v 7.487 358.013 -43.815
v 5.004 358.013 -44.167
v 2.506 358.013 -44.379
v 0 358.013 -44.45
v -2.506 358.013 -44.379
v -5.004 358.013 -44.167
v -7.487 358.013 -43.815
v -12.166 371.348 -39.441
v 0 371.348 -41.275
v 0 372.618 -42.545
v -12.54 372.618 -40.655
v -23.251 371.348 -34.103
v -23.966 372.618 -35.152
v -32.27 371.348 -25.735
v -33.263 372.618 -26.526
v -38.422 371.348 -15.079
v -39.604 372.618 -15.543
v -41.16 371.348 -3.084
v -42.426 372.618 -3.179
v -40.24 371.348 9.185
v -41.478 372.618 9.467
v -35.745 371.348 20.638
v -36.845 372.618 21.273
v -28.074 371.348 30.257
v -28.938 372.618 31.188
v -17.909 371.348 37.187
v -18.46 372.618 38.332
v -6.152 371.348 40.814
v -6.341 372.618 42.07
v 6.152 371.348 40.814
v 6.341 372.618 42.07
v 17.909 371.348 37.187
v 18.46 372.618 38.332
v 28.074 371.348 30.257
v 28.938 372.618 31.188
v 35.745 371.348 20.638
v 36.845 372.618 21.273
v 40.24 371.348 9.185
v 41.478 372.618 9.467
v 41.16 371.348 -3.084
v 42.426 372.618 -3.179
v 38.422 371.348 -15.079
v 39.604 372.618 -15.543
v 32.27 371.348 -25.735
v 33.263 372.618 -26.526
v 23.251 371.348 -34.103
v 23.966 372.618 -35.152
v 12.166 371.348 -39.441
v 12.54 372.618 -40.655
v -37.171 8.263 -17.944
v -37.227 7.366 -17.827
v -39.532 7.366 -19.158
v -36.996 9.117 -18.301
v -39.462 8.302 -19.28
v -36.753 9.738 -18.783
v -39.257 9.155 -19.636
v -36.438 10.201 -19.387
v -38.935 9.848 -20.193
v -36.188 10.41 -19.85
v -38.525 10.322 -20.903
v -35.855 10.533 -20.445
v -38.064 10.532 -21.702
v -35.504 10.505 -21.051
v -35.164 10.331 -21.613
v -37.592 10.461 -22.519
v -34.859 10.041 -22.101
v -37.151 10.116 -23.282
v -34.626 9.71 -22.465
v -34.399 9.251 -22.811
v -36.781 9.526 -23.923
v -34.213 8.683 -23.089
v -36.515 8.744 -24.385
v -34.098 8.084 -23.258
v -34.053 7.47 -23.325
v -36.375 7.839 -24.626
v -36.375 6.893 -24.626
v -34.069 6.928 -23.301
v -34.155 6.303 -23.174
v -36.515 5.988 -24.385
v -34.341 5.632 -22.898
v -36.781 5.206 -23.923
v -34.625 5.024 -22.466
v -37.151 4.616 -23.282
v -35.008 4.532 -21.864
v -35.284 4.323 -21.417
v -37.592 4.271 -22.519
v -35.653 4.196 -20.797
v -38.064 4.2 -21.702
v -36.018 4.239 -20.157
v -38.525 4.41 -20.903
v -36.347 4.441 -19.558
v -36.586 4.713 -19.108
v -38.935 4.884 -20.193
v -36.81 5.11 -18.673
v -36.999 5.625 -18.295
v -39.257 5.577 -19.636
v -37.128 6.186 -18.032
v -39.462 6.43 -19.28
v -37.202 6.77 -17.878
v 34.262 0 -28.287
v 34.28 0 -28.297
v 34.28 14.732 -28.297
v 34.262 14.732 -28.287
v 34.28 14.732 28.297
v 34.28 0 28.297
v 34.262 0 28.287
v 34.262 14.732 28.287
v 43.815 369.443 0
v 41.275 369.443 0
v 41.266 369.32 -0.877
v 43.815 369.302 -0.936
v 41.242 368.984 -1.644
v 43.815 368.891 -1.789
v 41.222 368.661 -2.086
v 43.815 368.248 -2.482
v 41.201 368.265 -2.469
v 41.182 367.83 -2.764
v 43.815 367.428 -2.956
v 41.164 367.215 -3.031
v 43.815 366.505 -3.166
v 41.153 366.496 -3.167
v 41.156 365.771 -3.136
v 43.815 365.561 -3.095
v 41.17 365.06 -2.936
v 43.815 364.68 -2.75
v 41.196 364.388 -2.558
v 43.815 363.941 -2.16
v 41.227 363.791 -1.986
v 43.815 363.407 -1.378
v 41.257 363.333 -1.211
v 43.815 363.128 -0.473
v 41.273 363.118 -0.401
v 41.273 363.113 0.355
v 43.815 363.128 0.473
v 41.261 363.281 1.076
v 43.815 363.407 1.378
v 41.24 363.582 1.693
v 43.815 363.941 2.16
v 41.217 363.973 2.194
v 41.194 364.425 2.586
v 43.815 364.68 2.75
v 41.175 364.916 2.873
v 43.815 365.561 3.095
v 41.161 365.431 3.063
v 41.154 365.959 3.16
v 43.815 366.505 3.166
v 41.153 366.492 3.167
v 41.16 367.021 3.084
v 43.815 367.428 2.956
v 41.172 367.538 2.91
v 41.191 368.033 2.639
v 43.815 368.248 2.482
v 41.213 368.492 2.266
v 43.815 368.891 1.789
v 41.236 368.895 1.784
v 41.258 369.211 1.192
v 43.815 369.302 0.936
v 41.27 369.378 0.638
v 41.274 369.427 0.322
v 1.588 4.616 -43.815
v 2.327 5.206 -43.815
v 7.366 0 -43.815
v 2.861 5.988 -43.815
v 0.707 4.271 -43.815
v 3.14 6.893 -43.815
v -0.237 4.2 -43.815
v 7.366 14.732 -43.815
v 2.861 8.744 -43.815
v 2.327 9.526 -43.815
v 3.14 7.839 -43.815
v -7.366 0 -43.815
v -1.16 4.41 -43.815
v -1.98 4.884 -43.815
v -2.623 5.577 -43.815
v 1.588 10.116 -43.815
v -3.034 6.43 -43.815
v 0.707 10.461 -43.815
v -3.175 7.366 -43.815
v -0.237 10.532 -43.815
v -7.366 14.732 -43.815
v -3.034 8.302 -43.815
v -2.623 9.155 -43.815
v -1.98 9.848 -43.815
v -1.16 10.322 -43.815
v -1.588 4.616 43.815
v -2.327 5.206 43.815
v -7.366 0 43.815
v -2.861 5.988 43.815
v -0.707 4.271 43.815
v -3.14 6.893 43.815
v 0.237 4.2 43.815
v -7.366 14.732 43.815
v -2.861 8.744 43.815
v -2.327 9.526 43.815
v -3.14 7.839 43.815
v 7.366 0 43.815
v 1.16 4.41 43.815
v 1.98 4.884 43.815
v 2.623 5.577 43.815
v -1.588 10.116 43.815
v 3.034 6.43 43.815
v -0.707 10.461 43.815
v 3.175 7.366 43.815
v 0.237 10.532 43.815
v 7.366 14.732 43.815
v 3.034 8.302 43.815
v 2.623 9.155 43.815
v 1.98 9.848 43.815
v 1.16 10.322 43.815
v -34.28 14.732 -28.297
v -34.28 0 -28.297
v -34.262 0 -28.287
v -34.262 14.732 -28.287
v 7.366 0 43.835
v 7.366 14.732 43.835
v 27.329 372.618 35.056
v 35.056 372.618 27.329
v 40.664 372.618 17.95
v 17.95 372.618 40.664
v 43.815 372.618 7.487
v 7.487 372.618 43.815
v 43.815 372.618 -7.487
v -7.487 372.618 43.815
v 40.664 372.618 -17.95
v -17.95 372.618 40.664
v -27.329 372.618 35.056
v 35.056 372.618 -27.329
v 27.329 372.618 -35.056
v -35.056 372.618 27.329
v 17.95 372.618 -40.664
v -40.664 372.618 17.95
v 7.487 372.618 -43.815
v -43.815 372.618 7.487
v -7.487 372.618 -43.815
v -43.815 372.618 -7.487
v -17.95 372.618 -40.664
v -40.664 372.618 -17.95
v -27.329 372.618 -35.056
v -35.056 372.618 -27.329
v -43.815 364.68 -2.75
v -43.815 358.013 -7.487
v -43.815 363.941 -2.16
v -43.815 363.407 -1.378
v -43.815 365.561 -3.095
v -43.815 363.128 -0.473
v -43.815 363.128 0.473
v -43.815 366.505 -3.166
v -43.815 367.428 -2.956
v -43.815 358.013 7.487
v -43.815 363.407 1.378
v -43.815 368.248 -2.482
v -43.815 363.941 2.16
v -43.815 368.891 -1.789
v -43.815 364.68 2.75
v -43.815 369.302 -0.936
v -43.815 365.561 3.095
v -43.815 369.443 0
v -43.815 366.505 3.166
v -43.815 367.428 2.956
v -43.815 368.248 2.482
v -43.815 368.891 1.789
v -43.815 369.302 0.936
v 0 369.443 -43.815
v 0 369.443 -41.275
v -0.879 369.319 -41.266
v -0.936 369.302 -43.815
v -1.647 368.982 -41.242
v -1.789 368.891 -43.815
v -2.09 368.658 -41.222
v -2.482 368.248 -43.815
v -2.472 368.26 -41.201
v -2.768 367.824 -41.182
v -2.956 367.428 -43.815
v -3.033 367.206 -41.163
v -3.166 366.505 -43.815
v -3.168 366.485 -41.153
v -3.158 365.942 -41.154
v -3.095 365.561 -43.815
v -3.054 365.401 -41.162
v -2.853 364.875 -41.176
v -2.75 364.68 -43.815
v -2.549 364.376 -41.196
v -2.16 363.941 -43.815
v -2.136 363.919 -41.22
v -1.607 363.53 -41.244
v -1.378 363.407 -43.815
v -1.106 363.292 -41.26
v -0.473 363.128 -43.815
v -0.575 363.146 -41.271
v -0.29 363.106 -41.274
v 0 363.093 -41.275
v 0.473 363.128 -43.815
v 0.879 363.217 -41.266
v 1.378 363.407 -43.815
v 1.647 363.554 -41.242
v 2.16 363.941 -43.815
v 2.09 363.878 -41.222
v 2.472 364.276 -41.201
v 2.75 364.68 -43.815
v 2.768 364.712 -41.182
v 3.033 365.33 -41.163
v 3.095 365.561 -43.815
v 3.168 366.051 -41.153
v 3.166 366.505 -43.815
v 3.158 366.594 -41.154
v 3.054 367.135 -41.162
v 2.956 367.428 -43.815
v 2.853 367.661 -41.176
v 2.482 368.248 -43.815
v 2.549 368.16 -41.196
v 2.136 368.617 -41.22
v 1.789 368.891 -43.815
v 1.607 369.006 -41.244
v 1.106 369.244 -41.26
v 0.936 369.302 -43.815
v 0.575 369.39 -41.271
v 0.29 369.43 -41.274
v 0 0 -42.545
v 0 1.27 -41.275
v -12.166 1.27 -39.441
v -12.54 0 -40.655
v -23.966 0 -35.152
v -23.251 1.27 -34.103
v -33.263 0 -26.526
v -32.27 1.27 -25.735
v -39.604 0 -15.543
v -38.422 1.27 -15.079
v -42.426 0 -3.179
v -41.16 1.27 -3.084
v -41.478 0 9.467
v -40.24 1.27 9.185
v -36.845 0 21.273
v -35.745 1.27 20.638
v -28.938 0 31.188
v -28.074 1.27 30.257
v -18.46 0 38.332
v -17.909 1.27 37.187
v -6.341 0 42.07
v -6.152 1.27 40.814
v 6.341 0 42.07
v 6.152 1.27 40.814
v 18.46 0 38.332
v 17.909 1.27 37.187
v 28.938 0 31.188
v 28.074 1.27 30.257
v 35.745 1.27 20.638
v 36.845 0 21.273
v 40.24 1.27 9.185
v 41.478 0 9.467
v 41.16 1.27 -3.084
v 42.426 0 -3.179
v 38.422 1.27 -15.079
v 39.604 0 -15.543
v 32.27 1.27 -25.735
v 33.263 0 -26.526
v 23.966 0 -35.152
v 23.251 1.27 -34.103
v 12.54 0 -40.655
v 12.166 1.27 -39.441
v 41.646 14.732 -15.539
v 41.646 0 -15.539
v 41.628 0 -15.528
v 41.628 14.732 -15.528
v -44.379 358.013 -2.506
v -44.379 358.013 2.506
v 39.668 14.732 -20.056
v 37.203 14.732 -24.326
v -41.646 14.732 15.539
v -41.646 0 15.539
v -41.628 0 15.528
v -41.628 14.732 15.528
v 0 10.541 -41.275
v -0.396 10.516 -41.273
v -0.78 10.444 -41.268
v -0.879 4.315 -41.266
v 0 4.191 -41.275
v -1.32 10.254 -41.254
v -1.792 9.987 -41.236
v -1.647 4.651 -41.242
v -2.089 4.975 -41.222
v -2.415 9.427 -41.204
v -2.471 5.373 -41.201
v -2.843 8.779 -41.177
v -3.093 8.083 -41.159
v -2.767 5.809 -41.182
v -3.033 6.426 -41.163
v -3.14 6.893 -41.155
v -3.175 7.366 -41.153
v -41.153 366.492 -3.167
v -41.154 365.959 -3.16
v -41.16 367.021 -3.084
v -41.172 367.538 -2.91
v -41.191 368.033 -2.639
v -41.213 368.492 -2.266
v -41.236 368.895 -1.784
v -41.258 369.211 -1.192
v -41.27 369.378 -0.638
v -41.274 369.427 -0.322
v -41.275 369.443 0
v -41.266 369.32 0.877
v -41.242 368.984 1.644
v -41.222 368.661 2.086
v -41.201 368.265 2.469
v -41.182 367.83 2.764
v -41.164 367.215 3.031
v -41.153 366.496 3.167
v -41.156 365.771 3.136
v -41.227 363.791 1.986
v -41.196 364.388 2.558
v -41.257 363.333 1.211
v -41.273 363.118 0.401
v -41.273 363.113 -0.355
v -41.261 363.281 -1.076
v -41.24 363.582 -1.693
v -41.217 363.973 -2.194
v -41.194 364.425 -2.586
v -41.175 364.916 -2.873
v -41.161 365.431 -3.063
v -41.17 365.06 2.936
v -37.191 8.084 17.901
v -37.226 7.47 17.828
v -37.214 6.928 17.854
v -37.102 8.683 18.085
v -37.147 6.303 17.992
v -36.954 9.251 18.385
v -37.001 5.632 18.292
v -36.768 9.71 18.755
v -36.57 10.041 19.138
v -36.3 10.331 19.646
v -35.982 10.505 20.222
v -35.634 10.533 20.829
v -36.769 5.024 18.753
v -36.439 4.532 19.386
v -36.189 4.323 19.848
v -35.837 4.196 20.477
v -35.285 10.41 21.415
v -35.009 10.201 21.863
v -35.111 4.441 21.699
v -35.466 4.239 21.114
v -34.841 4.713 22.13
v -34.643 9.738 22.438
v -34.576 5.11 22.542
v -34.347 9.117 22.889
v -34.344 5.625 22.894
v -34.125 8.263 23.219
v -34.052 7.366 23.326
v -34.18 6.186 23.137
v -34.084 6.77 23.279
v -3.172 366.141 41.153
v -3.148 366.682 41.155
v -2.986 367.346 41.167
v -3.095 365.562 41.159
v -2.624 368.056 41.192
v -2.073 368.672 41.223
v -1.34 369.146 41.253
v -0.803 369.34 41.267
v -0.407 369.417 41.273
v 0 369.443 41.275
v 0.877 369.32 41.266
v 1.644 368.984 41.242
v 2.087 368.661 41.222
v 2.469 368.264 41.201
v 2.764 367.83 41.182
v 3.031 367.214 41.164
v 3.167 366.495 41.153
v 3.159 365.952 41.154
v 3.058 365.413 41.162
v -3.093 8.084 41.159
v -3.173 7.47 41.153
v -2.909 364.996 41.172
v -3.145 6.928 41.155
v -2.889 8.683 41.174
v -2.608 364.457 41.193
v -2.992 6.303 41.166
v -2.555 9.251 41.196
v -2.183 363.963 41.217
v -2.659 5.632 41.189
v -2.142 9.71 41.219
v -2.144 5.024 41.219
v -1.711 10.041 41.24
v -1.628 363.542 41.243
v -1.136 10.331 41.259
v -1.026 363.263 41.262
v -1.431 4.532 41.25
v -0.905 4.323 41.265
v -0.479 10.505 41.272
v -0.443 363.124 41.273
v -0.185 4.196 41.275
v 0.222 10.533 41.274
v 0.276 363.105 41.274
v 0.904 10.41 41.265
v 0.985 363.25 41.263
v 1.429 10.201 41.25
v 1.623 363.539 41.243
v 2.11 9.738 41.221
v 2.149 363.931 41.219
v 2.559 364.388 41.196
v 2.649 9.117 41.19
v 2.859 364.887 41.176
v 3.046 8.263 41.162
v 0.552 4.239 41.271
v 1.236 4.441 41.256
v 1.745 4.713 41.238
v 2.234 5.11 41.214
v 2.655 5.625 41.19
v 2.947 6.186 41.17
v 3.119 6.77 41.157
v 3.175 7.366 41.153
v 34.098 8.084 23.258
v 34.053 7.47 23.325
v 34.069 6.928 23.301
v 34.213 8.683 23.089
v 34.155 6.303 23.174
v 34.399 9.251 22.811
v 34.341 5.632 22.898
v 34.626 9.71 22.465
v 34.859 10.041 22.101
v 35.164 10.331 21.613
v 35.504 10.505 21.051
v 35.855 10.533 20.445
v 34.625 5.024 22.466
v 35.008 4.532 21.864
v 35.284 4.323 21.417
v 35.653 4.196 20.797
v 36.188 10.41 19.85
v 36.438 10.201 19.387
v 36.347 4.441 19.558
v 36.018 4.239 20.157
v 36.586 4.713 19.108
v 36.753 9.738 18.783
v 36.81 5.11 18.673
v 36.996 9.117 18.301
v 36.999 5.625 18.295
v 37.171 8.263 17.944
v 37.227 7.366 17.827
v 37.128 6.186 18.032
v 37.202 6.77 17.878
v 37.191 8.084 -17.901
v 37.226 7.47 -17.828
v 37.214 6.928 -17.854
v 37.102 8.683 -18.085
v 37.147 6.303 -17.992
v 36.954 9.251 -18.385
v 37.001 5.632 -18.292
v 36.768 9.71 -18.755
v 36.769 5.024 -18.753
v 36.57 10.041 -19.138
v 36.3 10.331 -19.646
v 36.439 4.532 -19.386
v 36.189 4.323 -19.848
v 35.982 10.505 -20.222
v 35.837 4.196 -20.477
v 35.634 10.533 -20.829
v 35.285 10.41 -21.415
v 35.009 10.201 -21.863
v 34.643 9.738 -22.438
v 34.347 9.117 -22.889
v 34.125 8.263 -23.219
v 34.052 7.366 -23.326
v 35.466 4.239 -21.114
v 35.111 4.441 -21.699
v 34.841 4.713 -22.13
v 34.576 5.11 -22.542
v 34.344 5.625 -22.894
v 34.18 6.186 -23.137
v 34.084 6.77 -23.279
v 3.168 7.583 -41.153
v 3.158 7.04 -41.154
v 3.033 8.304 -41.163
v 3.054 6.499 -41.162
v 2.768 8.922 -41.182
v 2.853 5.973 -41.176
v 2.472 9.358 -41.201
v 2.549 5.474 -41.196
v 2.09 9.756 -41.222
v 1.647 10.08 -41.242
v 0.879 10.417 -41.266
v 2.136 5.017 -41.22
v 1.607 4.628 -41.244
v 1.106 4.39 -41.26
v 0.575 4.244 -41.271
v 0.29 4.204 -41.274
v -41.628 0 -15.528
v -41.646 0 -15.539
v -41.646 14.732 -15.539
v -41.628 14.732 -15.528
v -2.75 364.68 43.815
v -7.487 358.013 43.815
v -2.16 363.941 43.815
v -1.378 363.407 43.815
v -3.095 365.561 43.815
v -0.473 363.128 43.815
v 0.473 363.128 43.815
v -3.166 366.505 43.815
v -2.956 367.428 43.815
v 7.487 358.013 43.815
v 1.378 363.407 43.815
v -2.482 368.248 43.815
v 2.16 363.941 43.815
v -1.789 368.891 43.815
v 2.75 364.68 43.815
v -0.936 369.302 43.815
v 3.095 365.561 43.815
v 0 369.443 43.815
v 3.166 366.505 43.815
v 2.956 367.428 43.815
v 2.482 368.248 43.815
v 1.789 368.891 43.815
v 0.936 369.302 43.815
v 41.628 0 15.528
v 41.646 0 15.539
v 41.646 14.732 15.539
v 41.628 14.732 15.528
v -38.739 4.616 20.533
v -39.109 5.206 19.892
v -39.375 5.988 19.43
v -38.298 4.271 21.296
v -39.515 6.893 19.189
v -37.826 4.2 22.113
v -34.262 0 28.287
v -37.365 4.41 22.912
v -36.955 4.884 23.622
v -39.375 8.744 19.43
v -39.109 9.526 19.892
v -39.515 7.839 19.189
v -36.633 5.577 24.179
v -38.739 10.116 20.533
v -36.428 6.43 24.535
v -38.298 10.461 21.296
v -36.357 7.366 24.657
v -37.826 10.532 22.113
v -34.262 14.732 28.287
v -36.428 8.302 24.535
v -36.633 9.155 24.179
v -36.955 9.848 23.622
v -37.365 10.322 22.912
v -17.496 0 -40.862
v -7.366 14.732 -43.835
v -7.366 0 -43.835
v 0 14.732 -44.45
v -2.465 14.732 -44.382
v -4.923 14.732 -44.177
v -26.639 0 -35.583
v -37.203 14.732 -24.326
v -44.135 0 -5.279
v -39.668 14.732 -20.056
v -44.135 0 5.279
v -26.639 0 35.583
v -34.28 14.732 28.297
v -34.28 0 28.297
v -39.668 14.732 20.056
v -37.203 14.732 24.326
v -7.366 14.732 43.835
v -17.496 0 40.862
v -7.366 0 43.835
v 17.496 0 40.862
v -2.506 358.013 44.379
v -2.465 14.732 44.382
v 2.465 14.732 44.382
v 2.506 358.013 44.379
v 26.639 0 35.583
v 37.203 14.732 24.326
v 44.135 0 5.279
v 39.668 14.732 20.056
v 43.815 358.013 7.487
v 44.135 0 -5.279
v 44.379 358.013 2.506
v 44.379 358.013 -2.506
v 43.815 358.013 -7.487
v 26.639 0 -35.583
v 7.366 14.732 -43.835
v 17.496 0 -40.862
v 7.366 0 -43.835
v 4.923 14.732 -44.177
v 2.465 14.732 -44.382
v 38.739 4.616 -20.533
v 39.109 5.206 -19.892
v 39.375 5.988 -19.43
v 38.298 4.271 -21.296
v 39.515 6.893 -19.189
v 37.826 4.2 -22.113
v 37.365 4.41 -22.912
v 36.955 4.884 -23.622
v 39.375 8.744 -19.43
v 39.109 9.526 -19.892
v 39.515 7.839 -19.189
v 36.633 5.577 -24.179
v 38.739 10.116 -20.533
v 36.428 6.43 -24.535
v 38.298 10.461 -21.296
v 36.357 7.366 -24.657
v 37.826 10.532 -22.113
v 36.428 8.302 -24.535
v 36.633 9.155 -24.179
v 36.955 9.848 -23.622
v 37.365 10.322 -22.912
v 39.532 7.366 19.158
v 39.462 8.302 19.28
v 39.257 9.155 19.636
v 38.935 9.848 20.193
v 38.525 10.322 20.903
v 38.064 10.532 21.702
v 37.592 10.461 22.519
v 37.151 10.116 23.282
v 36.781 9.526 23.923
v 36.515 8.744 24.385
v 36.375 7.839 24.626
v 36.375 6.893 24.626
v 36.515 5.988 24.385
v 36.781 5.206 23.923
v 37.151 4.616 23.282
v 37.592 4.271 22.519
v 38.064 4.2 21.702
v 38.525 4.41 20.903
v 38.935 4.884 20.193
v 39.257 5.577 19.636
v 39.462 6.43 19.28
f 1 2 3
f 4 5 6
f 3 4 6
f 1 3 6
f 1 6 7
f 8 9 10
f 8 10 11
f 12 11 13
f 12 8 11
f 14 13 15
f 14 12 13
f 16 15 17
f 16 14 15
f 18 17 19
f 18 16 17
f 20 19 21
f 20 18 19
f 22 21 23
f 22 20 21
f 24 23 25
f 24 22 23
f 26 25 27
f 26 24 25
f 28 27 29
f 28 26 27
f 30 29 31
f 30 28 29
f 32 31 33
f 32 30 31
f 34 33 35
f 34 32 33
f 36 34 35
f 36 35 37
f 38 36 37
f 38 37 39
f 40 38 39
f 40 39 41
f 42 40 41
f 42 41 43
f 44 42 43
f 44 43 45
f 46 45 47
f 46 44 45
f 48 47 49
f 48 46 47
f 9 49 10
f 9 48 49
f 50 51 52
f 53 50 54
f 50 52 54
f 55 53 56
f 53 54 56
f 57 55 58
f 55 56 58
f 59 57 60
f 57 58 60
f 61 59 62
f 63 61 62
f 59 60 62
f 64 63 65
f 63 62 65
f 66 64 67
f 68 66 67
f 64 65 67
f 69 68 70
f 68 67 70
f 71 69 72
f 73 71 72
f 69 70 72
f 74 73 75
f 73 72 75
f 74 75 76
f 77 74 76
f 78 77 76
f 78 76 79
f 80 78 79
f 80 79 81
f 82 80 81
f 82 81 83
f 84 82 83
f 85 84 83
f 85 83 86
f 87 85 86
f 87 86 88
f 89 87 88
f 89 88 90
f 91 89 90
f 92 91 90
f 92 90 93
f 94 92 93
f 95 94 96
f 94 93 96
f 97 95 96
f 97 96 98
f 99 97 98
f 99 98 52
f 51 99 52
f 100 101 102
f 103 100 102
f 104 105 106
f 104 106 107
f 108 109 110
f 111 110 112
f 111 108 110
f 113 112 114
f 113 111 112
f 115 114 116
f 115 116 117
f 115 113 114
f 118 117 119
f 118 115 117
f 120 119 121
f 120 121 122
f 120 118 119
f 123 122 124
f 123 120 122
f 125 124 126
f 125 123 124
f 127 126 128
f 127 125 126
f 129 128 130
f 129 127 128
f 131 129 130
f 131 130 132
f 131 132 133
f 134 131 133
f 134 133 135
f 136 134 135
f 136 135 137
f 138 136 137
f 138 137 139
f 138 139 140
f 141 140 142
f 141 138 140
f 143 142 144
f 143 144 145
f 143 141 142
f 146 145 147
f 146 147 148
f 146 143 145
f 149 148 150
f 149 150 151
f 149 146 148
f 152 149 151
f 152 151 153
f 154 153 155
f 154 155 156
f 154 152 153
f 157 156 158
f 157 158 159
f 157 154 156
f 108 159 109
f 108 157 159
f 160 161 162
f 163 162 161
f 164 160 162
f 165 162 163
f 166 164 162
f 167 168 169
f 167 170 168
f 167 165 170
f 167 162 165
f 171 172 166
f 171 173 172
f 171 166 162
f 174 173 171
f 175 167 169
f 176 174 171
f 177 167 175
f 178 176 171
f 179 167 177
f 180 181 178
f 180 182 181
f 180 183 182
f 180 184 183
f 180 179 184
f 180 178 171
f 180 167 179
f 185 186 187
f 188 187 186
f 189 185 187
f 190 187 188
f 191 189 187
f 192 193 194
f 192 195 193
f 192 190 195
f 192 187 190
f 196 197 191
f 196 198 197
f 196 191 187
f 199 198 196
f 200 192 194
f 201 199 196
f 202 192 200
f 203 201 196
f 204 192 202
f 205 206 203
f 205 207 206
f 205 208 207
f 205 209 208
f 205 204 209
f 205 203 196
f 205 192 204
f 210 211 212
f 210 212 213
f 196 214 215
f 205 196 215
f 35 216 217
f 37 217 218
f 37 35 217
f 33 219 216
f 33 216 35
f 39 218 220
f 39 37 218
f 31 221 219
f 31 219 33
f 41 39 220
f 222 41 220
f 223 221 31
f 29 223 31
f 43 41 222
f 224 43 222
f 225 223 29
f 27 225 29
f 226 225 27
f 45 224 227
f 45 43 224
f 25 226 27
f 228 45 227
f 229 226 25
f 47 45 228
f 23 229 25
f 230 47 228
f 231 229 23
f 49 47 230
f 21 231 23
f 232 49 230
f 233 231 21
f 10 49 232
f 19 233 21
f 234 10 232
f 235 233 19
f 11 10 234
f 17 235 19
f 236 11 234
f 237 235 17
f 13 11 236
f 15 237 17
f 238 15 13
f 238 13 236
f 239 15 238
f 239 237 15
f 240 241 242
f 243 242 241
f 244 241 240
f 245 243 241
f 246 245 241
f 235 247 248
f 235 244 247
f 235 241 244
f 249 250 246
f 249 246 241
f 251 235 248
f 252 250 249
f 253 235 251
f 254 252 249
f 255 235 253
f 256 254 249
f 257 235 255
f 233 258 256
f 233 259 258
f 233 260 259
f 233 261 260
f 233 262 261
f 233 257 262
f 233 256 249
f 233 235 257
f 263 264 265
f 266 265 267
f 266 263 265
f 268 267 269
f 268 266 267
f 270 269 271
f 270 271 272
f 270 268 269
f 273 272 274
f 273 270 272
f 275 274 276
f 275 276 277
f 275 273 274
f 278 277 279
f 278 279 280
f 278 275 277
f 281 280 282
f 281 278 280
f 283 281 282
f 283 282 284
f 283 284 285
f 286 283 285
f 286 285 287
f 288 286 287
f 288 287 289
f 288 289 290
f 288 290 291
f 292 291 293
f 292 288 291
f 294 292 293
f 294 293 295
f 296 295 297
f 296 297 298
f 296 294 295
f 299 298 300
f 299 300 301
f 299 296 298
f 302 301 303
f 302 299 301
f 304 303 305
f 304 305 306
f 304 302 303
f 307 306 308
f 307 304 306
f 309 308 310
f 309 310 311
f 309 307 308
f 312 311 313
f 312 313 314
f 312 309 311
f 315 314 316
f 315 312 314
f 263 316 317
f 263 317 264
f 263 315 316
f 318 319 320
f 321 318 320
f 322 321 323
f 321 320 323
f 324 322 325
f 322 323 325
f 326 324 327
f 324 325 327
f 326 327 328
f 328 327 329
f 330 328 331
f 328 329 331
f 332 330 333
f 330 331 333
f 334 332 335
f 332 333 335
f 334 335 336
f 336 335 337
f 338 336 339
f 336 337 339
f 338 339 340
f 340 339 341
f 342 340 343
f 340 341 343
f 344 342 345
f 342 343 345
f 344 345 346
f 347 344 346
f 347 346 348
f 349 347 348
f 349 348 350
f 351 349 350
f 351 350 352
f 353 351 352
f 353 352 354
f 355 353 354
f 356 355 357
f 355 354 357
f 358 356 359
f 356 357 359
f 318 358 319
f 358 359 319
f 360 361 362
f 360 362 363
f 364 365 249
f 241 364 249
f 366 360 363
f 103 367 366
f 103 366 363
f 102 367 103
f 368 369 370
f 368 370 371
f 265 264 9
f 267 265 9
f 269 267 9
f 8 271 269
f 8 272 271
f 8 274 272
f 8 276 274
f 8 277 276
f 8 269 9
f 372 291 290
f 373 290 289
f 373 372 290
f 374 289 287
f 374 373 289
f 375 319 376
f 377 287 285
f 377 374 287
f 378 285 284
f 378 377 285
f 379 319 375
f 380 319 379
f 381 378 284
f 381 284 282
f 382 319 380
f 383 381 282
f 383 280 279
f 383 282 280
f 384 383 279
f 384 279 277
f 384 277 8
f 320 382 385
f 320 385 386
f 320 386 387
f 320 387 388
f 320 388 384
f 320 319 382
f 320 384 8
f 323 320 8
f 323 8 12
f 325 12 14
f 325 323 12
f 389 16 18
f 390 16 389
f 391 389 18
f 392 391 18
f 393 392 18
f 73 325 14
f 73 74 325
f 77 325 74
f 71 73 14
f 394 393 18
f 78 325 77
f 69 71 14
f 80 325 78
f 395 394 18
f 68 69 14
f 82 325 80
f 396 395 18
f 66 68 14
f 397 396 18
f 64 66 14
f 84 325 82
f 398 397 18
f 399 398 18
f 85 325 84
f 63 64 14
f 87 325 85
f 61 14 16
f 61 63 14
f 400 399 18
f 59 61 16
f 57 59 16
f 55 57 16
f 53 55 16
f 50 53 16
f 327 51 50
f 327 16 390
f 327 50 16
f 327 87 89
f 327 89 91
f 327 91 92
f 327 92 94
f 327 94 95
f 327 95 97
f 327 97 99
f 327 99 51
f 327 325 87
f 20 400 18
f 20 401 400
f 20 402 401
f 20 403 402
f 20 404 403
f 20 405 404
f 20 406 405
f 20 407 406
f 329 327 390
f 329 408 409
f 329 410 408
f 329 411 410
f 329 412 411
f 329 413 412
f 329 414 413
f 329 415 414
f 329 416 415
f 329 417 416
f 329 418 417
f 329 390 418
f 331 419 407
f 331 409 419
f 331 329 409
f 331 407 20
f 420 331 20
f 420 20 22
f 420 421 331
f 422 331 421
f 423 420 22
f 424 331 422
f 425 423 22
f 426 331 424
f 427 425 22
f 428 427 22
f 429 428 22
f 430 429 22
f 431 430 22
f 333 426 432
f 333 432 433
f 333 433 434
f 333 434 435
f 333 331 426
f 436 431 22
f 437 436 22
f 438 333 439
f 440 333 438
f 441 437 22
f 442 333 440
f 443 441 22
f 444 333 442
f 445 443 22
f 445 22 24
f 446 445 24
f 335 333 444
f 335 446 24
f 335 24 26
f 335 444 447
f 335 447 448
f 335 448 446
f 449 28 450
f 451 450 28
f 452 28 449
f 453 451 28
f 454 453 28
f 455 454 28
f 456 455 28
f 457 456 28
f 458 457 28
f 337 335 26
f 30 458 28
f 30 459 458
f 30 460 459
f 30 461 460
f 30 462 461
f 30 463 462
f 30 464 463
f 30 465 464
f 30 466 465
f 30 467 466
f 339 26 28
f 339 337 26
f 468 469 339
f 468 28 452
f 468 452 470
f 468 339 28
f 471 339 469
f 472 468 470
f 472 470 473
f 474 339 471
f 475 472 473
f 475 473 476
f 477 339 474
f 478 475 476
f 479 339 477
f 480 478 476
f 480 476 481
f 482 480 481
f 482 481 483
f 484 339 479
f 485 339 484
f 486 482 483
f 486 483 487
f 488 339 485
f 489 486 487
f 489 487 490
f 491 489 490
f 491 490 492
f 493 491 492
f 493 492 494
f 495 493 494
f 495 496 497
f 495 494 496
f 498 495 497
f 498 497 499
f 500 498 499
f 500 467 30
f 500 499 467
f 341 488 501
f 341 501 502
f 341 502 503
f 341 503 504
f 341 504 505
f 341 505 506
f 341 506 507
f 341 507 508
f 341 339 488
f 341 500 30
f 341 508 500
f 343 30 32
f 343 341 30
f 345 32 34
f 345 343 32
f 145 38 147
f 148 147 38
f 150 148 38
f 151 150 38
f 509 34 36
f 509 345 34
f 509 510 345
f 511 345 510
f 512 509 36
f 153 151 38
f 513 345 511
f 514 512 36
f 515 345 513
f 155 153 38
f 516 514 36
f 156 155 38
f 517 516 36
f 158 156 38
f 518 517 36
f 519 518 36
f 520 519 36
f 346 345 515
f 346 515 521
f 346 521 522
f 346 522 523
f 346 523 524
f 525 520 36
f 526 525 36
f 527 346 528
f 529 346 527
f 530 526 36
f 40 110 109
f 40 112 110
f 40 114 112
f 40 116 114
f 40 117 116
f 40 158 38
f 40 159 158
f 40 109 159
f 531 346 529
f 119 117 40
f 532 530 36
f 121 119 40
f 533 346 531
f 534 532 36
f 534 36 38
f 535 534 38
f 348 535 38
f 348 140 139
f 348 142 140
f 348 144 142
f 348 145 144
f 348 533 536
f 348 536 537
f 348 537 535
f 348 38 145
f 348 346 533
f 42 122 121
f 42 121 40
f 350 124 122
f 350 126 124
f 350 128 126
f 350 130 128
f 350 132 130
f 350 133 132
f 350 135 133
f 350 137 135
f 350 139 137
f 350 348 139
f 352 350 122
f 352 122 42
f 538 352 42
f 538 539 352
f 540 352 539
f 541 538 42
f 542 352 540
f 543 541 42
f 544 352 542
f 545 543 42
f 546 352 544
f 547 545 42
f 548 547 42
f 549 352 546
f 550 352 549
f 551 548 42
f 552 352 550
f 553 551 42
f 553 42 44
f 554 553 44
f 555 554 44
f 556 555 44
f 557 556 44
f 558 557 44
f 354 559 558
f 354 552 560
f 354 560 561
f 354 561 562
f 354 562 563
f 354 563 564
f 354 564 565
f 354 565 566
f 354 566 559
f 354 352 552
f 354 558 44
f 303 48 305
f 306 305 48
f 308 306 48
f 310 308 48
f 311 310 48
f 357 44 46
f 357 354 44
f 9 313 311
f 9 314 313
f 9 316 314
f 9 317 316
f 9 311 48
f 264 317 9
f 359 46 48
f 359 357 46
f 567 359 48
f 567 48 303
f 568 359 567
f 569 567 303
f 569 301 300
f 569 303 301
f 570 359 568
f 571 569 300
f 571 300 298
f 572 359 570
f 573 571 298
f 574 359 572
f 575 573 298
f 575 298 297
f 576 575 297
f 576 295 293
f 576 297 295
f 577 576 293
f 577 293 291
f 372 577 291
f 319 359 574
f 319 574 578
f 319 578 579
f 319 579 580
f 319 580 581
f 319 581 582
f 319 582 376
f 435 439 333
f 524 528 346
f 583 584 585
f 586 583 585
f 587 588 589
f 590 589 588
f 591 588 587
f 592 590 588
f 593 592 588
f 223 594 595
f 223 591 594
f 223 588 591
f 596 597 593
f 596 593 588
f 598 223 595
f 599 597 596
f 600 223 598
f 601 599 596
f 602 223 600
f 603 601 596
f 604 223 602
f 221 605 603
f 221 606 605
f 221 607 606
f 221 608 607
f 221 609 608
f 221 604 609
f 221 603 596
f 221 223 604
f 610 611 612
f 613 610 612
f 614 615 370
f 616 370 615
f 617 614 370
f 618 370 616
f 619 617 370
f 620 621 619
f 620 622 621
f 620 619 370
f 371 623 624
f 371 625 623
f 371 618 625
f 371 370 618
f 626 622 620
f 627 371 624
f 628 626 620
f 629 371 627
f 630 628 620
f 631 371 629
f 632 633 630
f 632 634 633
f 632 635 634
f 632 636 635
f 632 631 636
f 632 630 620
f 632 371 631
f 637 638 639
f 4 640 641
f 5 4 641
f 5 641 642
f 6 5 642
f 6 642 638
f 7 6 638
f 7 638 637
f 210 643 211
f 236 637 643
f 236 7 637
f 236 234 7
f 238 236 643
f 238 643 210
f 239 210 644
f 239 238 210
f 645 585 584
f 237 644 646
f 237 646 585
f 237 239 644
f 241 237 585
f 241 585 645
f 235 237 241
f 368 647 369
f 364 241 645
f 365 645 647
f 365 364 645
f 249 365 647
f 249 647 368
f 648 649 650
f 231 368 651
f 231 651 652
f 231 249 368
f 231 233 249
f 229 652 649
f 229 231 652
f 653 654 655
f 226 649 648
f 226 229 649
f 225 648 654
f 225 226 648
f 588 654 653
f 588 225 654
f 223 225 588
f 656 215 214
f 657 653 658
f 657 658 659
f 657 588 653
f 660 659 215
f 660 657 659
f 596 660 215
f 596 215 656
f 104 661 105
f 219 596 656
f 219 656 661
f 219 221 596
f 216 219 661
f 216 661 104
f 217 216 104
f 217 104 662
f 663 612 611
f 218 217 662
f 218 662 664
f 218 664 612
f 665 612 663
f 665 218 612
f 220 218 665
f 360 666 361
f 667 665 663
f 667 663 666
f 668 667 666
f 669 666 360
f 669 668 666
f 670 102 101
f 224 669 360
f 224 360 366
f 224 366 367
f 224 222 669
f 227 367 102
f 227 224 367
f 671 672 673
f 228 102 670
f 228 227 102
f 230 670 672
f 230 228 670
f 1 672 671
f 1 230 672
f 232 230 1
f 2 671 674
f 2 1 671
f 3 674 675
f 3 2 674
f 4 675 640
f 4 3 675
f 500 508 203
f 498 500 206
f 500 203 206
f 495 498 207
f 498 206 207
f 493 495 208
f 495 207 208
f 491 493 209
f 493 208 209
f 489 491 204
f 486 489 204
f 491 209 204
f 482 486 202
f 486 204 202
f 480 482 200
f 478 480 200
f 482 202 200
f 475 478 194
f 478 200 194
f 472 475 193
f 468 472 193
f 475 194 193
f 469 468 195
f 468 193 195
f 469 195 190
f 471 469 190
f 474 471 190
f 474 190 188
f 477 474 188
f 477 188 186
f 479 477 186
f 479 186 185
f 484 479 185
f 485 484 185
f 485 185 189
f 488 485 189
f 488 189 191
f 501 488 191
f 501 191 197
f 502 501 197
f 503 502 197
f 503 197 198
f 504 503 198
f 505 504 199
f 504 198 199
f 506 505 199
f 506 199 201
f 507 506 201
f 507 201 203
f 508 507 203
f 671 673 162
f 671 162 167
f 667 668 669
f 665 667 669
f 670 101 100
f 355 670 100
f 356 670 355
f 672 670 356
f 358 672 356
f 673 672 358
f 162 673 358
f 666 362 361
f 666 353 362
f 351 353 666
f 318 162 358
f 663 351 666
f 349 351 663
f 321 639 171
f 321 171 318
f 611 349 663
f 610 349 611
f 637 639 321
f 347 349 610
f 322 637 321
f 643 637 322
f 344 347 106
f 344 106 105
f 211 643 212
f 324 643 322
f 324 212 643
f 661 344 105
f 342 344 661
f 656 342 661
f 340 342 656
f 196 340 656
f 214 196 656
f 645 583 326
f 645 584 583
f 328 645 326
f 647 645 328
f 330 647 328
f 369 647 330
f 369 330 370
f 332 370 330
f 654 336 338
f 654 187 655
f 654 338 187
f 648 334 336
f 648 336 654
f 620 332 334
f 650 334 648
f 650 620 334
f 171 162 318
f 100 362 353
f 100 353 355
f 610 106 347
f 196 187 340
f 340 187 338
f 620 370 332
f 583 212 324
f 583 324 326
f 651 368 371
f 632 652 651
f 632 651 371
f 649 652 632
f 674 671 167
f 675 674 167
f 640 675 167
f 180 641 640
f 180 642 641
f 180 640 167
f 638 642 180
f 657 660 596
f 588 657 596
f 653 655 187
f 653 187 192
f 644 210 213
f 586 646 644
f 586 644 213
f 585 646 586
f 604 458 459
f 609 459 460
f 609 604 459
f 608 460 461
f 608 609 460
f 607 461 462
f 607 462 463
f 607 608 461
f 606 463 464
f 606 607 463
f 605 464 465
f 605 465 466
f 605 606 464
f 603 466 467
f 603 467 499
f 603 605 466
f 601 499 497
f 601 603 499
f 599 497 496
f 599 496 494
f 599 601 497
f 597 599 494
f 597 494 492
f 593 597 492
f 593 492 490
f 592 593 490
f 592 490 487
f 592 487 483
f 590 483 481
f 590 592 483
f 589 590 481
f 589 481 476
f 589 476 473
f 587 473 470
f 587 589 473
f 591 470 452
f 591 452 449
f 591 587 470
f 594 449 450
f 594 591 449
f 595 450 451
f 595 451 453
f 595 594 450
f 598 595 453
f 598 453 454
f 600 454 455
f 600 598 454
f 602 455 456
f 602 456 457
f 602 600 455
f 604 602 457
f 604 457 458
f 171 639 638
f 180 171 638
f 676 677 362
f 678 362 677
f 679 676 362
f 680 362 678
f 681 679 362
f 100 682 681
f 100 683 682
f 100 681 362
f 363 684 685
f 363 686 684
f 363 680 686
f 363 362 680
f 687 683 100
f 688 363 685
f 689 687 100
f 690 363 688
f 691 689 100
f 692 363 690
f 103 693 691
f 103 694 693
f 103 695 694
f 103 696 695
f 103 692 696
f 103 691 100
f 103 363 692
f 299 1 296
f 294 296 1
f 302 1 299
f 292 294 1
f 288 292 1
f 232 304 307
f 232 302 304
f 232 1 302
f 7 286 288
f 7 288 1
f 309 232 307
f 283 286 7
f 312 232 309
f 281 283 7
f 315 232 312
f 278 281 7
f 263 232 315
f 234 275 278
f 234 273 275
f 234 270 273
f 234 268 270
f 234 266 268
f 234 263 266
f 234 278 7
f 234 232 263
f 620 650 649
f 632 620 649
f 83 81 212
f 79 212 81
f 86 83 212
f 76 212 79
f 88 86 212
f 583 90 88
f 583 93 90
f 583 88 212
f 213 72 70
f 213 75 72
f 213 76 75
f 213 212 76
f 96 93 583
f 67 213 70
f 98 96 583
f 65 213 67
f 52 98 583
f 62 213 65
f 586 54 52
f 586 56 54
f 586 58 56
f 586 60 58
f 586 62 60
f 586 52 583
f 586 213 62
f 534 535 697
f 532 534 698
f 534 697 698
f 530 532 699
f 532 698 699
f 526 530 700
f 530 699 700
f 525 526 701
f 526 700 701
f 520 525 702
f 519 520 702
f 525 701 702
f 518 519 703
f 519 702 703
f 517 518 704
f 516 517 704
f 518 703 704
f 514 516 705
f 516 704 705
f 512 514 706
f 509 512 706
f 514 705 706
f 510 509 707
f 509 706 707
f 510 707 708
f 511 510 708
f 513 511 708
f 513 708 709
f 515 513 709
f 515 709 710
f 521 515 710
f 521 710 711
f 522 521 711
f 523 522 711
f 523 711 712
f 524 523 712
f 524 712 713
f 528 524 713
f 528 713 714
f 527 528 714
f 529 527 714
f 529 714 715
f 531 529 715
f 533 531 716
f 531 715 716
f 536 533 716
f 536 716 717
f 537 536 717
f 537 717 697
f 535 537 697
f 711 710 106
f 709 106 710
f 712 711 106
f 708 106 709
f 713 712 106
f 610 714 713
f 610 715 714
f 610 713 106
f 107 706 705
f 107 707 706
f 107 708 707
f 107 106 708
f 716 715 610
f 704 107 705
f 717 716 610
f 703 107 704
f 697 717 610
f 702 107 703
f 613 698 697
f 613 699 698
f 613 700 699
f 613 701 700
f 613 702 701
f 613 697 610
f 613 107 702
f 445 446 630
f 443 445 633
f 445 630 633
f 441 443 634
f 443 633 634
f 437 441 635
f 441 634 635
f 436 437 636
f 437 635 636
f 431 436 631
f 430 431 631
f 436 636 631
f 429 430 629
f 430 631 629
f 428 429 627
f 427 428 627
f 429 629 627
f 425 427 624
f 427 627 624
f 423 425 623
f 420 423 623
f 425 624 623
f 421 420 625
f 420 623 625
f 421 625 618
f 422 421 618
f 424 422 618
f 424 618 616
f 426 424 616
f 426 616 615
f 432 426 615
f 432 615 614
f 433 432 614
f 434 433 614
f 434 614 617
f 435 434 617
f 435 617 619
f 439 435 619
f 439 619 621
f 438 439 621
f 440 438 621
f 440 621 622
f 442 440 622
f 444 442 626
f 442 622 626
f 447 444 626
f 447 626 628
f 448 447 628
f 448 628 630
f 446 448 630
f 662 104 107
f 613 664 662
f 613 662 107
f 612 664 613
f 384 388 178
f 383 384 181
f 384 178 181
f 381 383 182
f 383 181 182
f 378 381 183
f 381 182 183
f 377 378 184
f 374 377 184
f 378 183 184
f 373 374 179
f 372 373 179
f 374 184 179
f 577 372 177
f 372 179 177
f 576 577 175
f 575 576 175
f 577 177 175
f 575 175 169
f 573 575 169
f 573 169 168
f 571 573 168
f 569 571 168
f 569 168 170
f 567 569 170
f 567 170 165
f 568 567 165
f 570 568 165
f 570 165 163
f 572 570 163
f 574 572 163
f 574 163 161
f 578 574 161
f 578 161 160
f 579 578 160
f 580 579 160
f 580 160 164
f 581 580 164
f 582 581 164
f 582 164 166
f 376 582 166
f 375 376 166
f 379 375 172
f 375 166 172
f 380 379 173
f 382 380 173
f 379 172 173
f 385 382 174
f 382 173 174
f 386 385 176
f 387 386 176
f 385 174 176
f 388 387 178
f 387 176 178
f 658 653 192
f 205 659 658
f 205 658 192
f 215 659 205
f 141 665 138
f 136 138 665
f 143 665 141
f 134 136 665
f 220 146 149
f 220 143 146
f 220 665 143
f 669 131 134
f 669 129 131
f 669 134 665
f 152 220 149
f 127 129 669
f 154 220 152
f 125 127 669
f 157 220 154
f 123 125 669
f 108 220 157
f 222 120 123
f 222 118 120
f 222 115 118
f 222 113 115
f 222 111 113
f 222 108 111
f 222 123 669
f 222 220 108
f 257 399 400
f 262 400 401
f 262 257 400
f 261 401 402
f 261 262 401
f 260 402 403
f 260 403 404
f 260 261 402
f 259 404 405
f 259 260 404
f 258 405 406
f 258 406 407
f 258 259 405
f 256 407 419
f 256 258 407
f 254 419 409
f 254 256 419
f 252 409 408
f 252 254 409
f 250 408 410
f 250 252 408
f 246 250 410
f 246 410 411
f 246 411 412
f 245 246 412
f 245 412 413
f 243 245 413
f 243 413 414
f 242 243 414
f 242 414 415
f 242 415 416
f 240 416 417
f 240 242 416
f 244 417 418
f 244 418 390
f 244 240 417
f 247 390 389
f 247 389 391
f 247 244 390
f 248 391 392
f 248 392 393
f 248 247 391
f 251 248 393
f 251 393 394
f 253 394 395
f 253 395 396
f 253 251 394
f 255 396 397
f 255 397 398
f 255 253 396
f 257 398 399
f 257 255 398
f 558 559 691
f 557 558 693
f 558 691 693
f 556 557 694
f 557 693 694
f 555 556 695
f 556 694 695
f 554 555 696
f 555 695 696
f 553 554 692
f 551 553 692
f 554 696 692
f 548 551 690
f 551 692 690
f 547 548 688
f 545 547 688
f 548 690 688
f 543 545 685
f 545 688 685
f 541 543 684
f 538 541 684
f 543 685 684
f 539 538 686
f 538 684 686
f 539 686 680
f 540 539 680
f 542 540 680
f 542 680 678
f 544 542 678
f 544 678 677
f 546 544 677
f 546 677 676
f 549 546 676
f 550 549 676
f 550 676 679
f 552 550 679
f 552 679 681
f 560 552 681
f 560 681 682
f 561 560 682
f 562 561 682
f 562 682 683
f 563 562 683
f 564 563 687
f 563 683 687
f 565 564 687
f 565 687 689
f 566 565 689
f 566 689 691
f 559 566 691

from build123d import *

# Parameters (mm, degrees)
F_1_4_0_25_DIAMETER_HOLE1_REACH  = 380.534
F_1_4_0_25_DIAMETER_HOLE1_BORE_R = 3.175
CIRPATTERN2_COUNT                = 4
CHAMFER1_SIZE                    = 1.27
CIRPATTERN1_COUNT                = 6
SKETCH7_W                        = 14.732
SKETCH7_H                        = 14.732
CUT_EXTRUDE1_DEPTH               = 0.635
SKETCH8_W                        = 16.51
SKETCH8_H                        = 16.51
CUT_EXTRUDE2_DEPTH               = 0.635
CIRPATTERN4_COUNT                = 6
CIRPATTERN5_COUNT                = 4


with BuildPart() as part:
    # Sketch2 → Revolve1 (revolve)
    with BuildSketch(Plane.XY, mode=Mode.PRIVATE) as revolve1_sk:
        Polygon((41.275, 0), (44.45, 0), (44.45, 372.618), (41.275, 372.618), (41.275, 186.309), align=None)
    revolve(revolve1_sk.sketch.rotate(Axis((0, 0, 0), (0, 1, 0)), 90), axis=Axis((0, 0, 0), (0, 1, 0)))

    # 1/4 (0.25) Diameter Hole1 bore (on position points) → 1/4 (0.25) Diameter Hole1 (cut, up to next)
    with BuildSketch(Plane(origin=(0, 7.366, -44.45), x_dir=(-1, 0, 0), z_dir=(0, 0, -1)), mode=Mode.PRIVATE) as f_1_4_0_25_diameter_hole1_sk1:
        Circle(F_1_4_0_25_DIAMETER_HOLE1_BORE_R)
    f_1_4_0_25_diameter_hole1_tool1 = extrude(f_1_4_0_25_diameter_hole1_sk1.sketch, amount=-F_1_4_0_25_DIAMETER_HOLE1_REACH, mode=Mode.PRIVATE) & part.part
    f_1_4_0_25_diameter_hole1 = f_1_4_0_25_diameter_hole1_tool1.solids().sort_by_distance((0, 7.366, -44.45))[0]
    add(f_1_4_0_25_diameter_hole1, mode=Mode.SUBTRACT)

    # Sketch6 → 1/4 (0.25) Diameter Hole2 (revolve, cut)
    with BuildSketch(Plane(origin=(0, 366.268, -44.45), x_dir=(0, 1, 0), z_dir=(1, 0, 0))):
        Polygon((0, 0), (0, 5.209732465), (3.175, 3.302), (3.175, 0), align=None)
    f_1_4_0_25_diameter_hole2 = revolve(axis=Axis((0, 366.268, -50.8), (0, 0, 1)), mode=Mode.SUBTRACT)

    # CirPattern2: 1/4 (0.25) Diameter Hole2 ×4 about axis
    cirpattern2_axis = Axis((0, -17.04721, 0), (0, 1, 0))
    for i in range(1, CIRPATTERN2_COUNT):
        add(f_1_4_0_25_diameter_hole2.rotate(cirpattern2_axis, i * 360 / CIRPATTERN2_COUNT), mode=Mode.SUBTRACT)

    # Chamfer1
    chamfer1_edges = [part.edges().sort_by_distance(p)[0] for p in [
        (0, 372.618, 41.275),
        (0, 0, 41.275),
    ]]
    chamfer(chamfer1_edges, length=CHAMFER1_SIZE)

    # CirPattern1: 1/4 (0.25) Diameter Hole1 ×6 about axis
    cirpattern1_axis = Axis((0, -17.04721, 0), (0, 1, 0))
    for i in range(1, CIRPATTERN1_COUNT):
        add(f_1_4_0_25_diameter_hole1.rotate(cirpattern1_axis, i * 360 / CIRPATTERN1_COUNT), mode=Mode.SUBTRACT)

    # Sketch7 → Cut-Extrude1 (cut)
    with BuildSketch(Plane(origin=(0, 0, -44.45), x_dir=(-1, 0, 0), z_dir=(0, 0, -1))):
        with Locations((0, 7.366)):
            Rectangle(SKETCH7_W, SKETCH7_H)
    cut_extrude1 = extrude(amount=-CUT_EXTRUDE1_DEPTH, mode=Mode.SUBTRACT)

    # Sketch8 → Cut-Extrude2 (cut)
    with BuildSketch(Plane(origin=(0, 0, -44.45), x_dir=(-1, 0, 0), z_dir=(0, 0, -1))):
        with Locations((0, 366.268)):
            Rectangle(SKETCH8_W, SKETCH8_H)
    cut_extrude2 = extrude(amount=-CUT_EXTRUDE2_DEPTH, mode=Mode.SUBTRACT)

    # CirPattern4: Cut-Extrude1 ×6 about axis
    cirpattern4_axis = Axis((0, 0, 0), (0, 1, 0))
    for i in range(1, CIRPATTERN4_COUNT):
        add(cut_extrude1.rotate(cirpattern4_axis, i * 360 / CIRPATTERN4_COUNT), mode=Mode.SUBTRACT)

    # CirPattern5: Cut-Extrude2 ×4 about axis
    cirpattern5_axis = Axis((0, 0, 0), (0, 1, 0))
    for i in range(1, CIRPATTERN5_COUNT):
        add(cut_extrude2.rotate(cirpattern5_axis, i * 360 / CIRPATTERN5_COUNT), mode=Mode.SUBTRACT)


solid = part.part
